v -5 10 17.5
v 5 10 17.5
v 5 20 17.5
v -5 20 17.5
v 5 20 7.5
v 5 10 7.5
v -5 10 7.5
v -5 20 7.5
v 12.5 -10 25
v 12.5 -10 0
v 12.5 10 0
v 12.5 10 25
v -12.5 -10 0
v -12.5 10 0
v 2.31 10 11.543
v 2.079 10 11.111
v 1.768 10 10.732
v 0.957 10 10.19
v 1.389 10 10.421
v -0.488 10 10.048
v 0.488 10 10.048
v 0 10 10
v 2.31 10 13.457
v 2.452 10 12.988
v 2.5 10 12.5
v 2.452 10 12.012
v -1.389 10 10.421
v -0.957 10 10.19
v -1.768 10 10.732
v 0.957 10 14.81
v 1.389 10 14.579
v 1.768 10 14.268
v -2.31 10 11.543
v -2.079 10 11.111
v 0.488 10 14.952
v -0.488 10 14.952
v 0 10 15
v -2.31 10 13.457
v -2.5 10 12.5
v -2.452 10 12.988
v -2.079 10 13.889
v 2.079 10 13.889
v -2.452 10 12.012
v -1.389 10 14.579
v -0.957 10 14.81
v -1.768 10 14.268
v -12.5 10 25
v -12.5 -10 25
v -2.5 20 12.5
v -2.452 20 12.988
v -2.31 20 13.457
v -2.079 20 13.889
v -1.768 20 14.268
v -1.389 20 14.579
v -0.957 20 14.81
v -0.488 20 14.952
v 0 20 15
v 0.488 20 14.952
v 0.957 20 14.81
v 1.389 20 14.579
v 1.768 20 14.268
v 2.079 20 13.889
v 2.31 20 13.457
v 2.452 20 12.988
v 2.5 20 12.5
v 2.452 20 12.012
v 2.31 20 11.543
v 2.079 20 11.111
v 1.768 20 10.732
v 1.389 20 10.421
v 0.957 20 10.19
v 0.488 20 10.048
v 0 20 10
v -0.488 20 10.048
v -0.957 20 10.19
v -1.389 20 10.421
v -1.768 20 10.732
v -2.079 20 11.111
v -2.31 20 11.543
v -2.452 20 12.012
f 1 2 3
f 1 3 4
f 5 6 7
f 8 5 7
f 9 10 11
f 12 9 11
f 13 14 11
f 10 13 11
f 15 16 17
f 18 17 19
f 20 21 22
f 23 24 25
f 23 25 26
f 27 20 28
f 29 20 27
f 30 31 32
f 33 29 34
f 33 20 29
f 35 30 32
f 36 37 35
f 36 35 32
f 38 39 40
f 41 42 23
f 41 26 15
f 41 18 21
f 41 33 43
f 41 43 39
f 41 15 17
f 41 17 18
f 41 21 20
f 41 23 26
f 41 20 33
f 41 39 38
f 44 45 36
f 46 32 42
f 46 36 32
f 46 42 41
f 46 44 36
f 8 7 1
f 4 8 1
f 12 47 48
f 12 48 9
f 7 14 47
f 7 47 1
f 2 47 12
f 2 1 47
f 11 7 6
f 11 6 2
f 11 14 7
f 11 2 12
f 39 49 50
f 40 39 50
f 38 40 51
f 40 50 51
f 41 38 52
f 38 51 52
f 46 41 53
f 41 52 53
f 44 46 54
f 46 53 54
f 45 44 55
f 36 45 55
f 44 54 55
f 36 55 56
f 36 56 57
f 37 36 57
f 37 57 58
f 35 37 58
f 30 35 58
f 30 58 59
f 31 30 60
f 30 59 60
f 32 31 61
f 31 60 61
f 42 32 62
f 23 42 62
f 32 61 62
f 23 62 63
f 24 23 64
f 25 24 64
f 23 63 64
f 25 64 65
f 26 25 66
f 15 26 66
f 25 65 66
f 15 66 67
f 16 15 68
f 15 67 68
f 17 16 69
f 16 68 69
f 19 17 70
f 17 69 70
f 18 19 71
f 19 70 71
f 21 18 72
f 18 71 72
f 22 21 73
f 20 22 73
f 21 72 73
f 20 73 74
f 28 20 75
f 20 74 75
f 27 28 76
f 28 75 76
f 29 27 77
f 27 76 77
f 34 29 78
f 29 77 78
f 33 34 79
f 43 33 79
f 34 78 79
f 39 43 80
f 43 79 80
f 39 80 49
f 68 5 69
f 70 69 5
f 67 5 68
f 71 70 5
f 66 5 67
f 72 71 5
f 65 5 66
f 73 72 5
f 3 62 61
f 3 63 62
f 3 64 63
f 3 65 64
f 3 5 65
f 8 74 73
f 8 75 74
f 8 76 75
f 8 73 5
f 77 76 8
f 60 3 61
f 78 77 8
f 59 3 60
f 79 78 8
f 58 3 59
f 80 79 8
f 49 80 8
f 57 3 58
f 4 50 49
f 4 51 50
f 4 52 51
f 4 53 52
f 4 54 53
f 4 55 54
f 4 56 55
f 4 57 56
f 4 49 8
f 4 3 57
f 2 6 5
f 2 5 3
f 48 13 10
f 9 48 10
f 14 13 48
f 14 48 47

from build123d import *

# Parameters (mm, degrees)
F0_W     = 25
F0_H     = 20
F1_DEPTH = 25
F2_W     = 10
F2_H     = 10
F3_DEPTH = 10
F4_R     = 2.5
F5_DEPTH = 10


with BuildPart() as f1:
    # F0 (on Top) → F1 (new body)
    with BuildSketch(Plane.XY):
        Rectangle(F0_W, F0_H)
    extrude(amount=F1_DEPTH)

    # F2 (on face) → F3 (join)
    with BuildSketch(Plane(origin=(0, 10, 0), x_dir=(-1, 0, 0), z_dir=(0, 1, 0))):
        with Locations((0, 12.5)):
            Rectangle(F2_W, F2_H)
    extrude(amount=F3_DEPTH)

    # F4 (on face) → F5 (cut, through all)
    with BuildSketch(Plane(origin=(0, 20, 0), x_dir=(-1, 0, 0), z_dir=(0, 1, 0))):
        with Locations((0, 12.5)):
            Circle(F4_R)
    extrude(amount=-F5_DEPTH, mode=Mode.SUBTRACT)


solid = f1.part
